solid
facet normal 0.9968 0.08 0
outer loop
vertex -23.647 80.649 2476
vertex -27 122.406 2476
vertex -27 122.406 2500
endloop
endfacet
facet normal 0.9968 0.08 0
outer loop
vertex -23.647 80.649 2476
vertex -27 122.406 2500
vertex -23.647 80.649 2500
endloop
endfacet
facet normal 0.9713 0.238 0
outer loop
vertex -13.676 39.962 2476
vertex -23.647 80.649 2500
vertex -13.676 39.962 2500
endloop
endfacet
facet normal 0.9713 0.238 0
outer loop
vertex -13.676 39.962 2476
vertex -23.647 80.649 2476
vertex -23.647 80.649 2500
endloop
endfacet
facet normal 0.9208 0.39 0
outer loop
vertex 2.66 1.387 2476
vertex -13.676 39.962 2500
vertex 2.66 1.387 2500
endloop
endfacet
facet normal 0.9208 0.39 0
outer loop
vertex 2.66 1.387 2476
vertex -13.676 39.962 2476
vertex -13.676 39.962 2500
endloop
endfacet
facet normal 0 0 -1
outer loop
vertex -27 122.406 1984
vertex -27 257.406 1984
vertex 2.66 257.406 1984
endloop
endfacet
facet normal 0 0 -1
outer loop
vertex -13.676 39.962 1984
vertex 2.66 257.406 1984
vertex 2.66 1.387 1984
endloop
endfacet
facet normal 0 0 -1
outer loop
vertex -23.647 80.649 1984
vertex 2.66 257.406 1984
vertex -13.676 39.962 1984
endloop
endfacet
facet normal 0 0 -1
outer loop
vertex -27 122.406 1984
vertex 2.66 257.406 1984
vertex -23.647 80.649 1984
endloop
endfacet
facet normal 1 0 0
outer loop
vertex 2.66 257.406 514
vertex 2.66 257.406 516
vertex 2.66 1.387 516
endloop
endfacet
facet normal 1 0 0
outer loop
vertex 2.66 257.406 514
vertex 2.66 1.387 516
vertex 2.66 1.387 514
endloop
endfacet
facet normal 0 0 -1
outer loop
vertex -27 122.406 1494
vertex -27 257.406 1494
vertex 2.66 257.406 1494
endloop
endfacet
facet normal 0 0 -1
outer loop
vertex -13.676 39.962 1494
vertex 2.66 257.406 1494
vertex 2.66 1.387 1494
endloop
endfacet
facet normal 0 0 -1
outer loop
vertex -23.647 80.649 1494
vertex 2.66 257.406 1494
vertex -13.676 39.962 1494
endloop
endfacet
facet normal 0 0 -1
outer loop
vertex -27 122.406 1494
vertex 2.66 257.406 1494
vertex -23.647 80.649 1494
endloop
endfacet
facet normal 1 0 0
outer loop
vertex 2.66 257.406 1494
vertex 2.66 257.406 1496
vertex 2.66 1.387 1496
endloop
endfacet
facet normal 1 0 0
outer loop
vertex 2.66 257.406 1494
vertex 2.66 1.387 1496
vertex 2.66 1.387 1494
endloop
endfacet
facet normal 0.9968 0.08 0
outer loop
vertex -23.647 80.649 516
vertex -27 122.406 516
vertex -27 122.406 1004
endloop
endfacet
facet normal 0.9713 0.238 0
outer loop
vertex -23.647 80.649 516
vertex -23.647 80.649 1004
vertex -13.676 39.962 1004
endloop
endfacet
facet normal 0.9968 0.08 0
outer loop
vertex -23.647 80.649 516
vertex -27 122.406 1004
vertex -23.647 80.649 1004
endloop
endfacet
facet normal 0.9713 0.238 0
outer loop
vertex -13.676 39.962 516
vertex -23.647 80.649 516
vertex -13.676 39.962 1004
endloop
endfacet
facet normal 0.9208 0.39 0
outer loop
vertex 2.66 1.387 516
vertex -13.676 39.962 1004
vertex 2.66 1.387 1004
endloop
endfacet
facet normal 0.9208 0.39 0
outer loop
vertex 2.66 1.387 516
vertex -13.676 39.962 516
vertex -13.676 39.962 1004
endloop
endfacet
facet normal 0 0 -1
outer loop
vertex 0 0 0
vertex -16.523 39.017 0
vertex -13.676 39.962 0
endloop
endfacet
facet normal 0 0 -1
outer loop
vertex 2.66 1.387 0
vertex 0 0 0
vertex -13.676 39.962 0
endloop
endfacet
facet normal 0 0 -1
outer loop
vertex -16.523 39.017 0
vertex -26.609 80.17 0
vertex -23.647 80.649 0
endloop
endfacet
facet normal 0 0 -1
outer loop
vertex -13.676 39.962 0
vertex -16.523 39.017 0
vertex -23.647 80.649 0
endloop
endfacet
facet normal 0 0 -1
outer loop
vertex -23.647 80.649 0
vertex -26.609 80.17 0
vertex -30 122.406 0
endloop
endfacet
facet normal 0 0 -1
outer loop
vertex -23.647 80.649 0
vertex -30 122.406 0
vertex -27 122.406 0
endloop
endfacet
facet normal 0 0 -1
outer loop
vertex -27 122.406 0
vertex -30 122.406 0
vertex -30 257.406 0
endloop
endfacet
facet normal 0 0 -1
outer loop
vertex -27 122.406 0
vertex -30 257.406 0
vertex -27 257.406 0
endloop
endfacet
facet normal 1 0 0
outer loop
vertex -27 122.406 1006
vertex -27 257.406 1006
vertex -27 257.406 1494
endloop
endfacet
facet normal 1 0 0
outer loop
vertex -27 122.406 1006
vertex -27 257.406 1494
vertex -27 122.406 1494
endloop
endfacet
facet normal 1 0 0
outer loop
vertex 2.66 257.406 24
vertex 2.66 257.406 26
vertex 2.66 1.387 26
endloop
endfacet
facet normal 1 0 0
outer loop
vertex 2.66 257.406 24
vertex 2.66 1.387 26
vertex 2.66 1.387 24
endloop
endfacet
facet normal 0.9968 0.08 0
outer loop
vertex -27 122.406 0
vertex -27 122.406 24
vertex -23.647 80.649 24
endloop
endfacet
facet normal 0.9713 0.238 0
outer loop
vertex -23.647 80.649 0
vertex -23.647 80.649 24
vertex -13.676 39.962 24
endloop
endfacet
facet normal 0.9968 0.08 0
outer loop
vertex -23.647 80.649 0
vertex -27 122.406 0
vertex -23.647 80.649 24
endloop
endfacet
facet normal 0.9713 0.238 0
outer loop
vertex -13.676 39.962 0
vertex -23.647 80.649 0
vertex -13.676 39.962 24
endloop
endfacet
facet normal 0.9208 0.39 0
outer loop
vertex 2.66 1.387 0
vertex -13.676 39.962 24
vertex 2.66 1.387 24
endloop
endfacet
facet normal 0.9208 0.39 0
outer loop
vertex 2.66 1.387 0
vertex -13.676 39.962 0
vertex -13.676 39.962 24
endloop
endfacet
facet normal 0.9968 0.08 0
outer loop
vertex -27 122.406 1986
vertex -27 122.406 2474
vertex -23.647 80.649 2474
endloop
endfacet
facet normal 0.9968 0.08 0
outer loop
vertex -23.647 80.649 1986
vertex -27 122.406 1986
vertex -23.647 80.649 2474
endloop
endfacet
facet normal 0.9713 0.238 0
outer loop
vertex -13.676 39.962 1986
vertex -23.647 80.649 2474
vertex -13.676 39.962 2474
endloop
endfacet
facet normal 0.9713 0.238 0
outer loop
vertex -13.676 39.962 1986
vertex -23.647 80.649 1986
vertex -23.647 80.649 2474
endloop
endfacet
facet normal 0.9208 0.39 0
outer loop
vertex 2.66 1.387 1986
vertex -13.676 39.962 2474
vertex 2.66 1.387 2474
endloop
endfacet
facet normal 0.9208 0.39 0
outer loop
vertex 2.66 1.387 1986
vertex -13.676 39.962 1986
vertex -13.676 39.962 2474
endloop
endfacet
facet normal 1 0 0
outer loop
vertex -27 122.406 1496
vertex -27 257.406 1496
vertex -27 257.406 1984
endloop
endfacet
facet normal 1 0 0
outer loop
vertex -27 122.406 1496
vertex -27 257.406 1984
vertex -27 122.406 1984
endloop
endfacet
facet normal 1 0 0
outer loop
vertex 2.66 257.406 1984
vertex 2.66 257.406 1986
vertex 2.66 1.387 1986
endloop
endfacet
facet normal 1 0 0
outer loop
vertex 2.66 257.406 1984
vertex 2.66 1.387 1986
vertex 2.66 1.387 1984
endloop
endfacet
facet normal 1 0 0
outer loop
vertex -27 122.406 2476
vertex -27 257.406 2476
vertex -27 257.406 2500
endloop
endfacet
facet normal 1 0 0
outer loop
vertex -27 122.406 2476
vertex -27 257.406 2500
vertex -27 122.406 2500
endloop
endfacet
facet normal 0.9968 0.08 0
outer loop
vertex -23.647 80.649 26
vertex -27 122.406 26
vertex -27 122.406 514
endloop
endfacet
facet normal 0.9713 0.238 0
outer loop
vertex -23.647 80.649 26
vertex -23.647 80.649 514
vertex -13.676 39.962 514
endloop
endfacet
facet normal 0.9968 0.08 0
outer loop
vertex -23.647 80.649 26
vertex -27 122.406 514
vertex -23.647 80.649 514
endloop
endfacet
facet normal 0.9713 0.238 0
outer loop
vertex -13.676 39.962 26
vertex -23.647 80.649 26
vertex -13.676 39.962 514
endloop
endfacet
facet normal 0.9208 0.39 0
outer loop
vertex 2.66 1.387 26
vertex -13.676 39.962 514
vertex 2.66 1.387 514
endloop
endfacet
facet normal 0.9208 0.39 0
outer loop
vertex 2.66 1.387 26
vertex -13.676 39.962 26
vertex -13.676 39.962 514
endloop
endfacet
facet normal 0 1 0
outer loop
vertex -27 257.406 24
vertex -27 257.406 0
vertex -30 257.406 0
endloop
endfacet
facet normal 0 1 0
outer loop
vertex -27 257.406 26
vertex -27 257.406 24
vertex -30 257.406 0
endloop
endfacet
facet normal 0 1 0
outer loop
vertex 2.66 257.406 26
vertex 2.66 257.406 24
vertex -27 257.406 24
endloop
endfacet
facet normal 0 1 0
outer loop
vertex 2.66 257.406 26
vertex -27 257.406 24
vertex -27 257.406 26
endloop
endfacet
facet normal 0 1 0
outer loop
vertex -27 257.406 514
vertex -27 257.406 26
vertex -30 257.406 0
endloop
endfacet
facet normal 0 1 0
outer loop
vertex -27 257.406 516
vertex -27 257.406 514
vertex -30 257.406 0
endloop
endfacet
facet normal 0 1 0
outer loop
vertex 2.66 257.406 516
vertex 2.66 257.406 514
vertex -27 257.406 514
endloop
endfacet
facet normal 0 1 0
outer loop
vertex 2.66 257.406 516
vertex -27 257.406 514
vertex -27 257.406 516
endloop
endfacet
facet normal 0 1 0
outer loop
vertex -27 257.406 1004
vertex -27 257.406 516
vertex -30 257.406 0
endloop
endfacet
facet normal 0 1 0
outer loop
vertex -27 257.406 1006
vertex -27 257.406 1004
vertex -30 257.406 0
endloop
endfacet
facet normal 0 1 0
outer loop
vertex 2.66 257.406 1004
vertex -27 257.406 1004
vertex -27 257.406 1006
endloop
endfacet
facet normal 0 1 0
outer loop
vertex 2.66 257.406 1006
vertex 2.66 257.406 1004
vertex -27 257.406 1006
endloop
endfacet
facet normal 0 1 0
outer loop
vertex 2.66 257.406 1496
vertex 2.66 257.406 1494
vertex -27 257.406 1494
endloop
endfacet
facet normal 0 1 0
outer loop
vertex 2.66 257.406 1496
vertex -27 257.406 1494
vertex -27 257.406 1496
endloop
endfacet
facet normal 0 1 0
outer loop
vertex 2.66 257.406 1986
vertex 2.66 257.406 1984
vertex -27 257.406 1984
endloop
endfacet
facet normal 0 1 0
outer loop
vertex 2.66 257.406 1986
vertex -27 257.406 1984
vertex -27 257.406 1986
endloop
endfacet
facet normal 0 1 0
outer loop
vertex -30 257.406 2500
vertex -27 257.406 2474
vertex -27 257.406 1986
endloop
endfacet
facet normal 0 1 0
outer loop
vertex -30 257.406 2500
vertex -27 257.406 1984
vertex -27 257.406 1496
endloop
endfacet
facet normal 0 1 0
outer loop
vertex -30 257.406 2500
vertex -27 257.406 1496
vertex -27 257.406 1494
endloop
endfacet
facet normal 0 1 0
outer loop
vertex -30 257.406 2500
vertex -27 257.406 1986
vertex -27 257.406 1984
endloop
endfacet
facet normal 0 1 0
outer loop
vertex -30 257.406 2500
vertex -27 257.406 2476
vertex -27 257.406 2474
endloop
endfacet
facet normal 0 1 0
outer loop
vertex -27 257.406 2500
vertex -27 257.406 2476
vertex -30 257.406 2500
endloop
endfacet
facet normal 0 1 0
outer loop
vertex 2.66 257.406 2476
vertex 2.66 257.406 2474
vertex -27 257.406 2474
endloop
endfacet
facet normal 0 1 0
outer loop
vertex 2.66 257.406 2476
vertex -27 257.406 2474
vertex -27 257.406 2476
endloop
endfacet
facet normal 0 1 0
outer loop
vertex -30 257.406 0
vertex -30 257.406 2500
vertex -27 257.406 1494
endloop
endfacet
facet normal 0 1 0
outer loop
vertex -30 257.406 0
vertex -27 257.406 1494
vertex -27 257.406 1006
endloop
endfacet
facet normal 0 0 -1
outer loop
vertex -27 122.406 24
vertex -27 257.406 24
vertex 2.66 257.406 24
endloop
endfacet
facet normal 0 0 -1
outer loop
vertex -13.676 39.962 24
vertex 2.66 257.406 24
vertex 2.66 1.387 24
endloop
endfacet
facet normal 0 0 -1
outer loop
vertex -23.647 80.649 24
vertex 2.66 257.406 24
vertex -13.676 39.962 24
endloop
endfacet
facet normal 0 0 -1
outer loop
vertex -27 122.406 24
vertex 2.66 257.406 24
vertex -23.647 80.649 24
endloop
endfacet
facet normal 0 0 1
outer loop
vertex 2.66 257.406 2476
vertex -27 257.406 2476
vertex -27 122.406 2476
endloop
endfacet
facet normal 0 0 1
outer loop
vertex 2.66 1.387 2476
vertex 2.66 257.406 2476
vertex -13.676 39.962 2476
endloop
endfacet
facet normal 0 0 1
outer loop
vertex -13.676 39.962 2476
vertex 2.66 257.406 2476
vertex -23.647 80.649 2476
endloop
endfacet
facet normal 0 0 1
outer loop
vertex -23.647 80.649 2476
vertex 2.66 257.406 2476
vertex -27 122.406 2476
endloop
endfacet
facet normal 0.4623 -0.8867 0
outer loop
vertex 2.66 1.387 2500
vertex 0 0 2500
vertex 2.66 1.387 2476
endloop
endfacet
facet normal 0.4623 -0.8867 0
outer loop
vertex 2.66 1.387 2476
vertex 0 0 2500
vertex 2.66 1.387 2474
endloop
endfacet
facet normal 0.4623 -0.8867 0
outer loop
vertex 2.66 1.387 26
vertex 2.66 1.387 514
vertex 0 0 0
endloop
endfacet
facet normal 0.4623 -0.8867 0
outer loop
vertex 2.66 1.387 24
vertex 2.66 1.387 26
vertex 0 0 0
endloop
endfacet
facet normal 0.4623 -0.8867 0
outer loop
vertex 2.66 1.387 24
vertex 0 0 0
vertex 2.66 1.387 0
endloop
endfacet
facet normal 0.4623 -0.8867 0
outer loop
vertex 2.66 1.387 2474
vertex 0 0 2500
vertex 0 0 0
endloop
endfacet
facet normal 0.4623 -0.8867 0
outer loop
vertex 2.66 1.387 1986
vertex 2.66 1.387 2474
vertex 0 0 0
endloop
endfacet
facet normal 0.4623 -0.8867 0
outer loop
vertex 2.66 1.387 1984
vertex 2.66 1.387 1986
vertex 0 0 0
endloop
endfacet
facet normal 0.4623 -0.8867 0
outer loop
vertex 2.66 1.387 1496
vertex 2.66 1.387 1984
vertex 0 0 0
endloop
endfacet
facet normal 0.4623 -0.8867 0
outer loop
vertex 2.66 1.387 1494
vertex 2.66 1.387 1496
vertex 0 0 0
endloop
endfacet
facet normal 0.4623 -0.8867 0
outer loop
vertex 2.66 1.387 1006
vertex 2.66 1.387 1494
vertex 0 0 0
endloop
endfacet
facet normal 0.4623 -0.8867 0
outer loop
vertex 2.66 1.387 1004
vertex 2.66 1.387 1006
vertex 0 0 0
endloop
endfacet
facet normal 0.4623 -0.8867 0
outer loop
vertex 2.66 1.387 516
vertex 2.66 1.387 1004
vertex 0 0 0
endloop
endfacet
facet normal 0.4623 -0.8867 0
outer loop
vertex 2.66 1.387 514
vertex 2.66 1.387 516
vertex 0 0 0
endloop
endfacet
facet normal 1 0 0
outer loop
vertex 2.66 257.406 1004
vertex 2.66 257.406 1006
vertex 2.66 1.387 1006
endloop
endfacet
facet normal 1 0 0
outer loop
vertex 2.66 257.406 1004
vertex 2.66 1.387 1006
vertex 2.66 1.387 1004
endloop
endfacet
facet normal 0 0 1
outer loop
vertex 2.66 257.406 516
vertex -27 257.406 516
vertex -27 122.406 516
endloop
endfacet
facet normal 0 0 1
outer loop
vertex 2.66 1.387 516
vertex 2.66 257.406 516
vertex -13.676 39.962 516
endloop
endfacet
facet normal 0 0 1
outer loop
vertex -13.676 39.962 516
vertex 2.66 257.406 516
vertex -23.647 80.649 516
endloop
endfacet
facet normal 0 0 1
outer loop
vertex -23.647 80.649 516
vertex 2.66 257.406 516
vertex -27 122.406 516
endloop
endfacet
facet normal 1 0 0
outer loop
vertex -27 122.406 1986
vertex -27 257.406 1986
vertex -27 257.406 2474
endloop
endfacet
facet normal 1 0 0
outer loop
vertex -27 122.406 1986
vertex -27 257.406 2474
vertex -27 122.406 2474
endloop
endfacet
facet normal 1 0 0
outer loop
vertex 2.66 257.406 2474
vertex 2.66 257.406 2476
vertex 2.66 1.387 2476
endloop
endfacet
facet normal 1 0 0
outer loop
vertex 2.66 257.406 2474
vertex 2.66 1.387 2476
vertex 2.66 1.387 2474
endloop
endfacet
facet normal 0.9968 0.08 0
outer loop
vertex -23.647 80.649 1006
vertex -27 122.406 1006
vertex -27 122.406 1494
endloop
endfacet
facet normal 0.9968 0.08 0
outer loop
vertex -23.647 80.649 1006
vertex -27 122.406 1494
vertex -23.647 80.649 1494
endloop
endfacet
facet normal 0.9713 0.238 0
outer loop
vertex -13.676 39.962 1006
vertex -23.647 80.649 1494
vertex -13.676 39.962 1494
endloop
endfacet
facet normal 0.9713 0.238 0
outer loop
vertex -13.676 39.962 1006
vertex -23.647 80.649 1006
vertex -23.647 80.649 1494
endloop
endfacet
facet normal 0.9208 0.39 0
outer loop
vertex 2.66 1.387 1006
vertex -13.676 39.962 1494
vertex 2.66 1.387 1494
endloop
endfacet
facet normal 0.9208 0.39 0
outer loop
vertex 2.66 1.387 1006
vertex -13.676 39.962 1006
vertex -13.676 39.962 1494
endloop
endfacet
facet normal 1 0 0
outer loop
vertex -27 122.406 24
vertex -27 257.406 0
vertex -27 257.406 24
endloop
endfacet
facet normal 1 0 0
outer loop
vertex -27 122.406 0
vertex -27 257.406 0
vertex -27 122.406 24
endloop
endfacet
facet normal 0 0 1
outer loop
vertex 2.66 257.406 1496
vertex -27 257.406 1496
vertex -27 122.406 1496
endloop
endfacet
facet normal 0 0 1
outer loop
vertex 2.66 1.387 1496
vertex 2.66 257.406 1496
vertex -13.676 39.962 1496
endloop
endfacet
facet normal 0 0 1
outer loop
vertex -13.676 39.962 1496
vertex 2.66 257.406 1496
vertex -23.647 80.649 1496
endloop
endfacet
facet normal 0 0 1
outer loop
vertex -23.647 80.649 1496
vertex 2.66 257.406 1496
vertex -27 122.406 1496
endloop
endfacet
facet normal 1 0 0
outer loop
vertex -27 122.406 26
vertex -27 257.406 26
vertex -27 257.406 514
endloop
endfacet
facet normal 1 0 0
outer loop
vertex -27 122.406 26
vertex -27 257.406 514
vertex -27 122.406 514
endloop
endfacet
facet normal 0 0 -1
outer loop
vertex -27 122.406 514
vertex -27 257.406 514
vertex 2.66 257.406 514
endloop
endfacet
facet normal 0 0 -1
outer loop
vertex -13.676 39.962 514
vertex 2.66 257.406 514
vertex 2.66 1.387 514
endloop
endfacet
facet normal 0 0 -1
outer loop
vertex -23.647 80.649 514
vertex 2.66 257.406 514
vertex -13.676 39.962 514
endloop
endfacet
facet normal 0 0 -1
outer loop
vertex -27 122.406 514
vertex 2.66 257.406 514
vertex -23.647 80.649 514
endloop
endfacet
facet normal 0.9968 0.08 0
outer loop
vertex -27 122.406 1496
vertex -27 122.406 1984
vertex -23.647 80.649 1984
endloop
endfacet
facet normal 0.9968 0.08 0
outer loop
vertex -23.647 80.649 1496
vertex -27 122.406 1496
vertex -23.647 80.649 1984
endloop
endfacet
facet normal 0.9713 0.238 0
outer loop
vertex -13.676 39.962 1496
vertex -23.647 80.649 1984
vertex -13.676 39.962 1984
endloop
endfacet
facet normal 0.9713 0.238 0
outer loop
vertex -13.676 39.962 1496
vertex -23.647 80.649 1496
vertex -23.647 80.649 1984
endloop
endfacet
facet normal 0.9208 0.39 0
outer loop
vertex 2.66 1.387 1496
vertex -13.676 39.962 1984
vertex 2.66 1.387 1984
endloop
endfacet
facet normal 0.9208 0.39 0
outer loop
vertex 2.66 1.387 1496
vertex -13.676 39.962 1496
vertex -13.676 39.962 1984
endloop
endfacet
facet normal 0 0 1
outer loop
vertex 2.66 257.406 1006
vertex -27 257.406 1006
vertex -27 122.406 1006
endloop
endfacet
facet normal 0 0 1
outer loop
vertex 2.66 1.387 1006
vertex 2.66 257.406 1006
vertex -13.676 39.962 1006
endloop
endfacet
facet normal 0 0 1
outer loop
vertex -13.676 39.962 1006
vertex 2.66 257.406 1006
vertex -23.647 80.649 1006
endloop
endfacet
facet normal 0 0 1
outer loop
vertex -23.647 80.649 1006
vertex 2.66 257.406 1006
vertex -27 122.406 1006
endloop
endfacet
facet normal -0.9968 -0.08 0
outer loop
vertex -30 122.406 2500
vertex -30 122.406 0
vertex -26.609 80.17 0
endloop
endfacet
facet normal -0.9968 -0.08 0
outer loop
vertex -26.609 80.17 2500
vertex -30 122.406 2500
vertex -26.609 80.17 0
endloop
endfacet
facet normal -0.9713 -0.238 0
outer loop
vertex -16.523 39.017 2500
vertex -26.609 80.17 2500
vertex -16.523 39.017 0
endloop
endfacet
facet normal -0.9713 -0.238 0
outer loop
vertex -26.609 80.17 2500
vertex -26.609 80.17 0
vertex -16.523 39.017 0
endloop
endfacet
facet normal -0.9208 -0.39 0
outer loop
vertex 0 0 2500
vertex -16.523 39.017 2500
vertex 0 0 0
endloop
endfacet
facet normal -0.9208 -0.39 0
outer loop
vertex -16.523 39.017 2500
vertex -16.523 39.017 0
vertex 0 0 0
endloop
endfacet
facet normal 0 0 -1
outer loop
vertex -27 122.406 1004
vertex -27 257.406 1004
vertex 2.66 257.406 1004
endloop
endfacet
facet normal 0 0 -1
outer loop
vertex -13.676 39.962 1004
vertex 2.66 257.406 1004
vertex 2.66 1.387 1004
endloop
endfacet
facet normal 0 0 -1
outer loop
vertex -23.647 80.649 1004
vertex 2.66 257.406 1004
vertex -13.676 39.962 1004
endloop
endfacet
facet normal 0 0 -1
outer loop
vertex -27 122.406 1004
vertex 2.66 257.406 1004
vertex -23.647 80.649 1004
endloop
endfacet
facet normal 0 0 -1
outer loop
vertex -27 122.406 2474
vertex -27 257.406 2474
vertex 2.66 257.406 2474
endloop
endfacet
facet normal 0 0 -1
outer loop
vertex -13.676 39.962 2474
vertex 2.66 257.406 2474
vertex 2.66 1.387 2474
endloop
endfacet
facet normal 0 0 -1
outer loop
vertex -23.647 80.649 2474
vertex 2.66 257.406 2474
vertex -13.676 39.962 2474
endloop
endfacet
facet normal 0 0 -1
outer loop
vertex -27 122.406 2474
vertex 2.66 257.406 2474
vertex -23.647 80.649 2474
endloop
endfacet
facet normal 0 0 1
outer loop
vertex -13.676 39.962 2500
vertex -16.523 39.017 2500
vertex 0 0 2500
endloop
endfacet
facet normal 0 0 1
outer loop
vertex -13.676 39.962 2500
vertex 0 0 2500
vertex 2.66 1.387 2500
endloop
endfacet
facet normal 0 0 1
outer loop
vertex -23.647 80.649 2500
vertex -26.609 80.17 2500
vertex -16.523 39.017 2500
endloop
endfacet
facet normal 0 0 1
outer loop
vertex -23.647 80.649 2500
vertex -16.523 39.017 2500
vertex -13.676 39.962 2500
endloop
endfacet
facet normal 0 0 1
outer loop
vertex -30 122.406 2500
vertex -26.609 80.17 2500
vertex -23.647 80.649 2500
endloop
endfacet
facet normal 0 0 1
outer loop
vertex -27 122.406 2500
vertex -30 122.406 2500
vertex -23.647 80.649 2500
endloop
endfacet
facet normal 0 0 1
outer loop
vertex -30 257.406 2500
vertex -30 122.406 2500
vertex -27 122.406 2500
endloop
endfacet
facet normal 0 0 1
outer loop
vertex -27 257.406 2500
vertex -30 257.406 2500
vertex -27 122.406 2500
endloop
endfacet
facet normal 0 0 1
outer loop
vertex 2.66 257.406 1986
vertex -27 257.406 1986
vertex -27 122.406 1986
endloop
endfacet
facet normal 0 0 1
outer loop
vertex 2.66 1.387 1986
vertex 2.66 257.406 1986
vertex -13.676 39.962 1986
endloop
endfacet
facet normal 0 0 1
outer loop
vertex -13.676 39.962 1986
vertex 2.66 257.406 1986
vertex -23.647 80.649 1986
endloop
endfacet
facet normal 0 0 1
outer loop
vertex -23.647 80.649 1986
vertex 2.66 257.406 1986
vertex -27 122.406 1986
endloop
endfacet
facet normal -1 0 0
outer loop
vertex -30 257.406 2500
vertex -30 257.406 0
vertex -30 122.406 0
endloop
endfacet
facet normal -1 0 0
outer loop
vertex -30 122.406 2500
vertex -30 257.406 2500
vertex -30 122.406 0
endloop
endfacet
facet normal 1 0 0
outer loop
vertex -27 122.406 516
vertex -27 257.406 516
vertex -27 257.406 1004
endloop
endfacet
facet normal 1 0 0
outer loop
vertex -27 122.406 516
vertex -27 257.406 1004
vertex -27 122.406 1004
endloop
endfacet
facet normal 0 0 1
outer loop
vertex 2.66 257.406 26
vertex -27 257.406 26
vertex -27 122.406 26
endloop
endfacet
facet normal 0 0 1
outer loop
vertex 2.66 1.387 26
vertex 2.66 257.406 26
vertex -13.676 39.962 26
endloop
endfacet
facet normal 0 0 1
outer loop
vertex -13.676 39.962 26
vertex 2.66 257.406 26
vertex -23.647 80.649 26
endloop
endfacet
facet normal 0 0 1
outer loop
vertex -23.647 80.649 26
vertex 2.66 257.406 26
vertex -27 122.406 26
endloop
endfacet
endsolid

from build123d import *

# Parameters (mm, degrees)
SURFACE_EXTRUDE1_1_DEPTH = 2500
THICKEN1_T1              = 3
BOSS_EXTRUDE1_REACH      = 2515.396
SKETCH2_W                = 29.660018132
SKETCH2_H                = 2


with BuildPart() as body_1:
    # Surface-Extrude1: a surface, the sketch's curves swept straight by 2500 mm
    with BuildLine(Plane.XY, mode=Mode.PRIVATE) as surface_extrude1_1_path:
        Line((-30, 257.405882212), (-30, 122.405882212))
        ThreePointArc((-30, 122.405882212), (-22.390634553, 59.391598117), (0, 0))
    surface_extrude1_1 = Shell.extrude(surface_extrude1_1_path.wire(), (0 * SURFACE_EXTRUDE1_1_DEPTH, 0 * SURFACE_EXTRUDE1_1_DEPTH, 1 * SURFACE_EXTRUDE1_1_DEPTH))
    add(Solid.thicken(surface_extrude1_1, THICKEN1_T1))

    # Sketch2 → Boss-Extrude1 (add, up to next)
    with BuildSketch(Plane(origin=(0, 257.405882212, 0), x_dir=(1, 0, 0), z_dir=(0, 1, 0)), mode=Mode.PRIVATE) as boss_extrude1_sk1:
        with Locations((-12.169990934, -2475)):
            Rectangle(SKETCH2_W, SKETCH2_H)
    boss_extrude1_tool1 = extrude(boss_extrude1_sk1.sketch, amount=-BOSS_EXTRUDE1_REACH, mode=Mode.PRIVATE) - body_1.part
    # Sketch2 → Boss-Extrude1 (add, up to next)
    with BuildSketch(Plane(origin=(0, 257.405882212, 0), x_dir=(1, 0, 0), z_dir=(0, 1, 0)), mode=Mode.PRIVATE) as boss_extrude1_sk2:
        with Locations((-12.169990934, -1985)):
            Rectangle(SKETCH2_W, SKETCH2_H)
    boss_extrude1_tool2 = extrude(boss_extrude1_sk2.sketch, amount=-BOSS_EXTRUDE1_REACH, mode=Mode.PRIVATE) - body_1.part
    # Sketch2 → Boss-Extrude1 (add, up to next)
    with BuildSketch(Plane(origin=(0, 257.405882212, 0), x_dir=(1, 0, 0), z_dir=(0, 1, 0)), mode=Mode.PRIVATE) as boss_extrude1_sk3:
        with Locations((-12.169990934, -1495)):
            Rectangle(SKETCH2_W, SKETCH2_H)
    boss_extrude1_tool3 = extrude(boss_extrude1_sk3.sketch, amount=-BOSS_EXTRUDE1_REACH, mode=Mode.PRIVATE) - body_1.part
    # Sketch2 → Boss-Extrude1 (add, up to next)
    with BuildSketch(Plane(origin=(0, 257.405882212, 0), x_dir=(1, 0, 0), z_dir=(0, 1, 0)), mode=Mode.PRIVATE) as boss_extrude1_sk4:
        with Locations((-12.169990934, -1005)):
            Rectangle(SKETCH2_W, SKETCH2_H)
    boss_extrude1_tool4 = extrude(boss_extrude1_sk4.sketch, amount=-BOSS_EXTRUDE1_REACH, mode=Mode.PRIVATE) - body_1.part
    # Sketch2 → Boss-Extrude1 (add, up to next)
    with BuildSketch(Plane(origin=(0, 257.405882212, 0), x_dir=(1, 0, 0), z_dir=(0, 1, 0)), mode=Mode.PRIVATE) as boss_extrude1_sk5:
        with Locations((-12.169990934, -515)):
            Rectangle(SKETCH2_W, SKETCH2_H)
    boss_extrude1_tool5 = extrude(boss_extrude1_sk5.sketch, amount=-BOSS_EXTRUDE1_REACH, mode=Mode.PRIVATE) - body_1.part
    # Sketch2 → Boss-Extrude1 (add, up to next)
    with BuildSketch(Plane(origin=(0, 257.405882212, 0), x_dir=(1, 0, 0), z_dir=(0, 1, 0)), mode=Mode.PRIVATE) as boss_extrude1_sk6:
        with Locations((-12.169990934, -25)):
            Rectangle(SKETCH2_W, SKETCH2_H)
    boss_extrude1_tool6 = extrude(boss_extrude1_sk6.sketch, amount=-BOSS_EXTRUDE1_REACH, mode=Mode.PRIVATE) - body_1.part
    add(boss_extrude1_tool1.solids().sort_by_distance((-12.169991, 257.405882, 2475))[0])
    add(boss_extrude1_tool2.solids().sort_by_distance((-12.169991, 257.405882, 1985))[0])
    add(boss_extrude1_tool3.solids().sort_by_distance((-12.169991, 257.405882, 1495))[0])
    add(boss_extrude1_tool4.solids().sort_by_distance((-12.169991, 257.405882, 1005))[0])
    add(boss_extrude1_tool5.solids().sort_by_distance((-12.169991, 257.405882, 515))[0])
    add(boss_extrude1_tool6.solids().sort_by_distance((-12.169991, 257.405882, 25))[0])


solid = body_1.part
